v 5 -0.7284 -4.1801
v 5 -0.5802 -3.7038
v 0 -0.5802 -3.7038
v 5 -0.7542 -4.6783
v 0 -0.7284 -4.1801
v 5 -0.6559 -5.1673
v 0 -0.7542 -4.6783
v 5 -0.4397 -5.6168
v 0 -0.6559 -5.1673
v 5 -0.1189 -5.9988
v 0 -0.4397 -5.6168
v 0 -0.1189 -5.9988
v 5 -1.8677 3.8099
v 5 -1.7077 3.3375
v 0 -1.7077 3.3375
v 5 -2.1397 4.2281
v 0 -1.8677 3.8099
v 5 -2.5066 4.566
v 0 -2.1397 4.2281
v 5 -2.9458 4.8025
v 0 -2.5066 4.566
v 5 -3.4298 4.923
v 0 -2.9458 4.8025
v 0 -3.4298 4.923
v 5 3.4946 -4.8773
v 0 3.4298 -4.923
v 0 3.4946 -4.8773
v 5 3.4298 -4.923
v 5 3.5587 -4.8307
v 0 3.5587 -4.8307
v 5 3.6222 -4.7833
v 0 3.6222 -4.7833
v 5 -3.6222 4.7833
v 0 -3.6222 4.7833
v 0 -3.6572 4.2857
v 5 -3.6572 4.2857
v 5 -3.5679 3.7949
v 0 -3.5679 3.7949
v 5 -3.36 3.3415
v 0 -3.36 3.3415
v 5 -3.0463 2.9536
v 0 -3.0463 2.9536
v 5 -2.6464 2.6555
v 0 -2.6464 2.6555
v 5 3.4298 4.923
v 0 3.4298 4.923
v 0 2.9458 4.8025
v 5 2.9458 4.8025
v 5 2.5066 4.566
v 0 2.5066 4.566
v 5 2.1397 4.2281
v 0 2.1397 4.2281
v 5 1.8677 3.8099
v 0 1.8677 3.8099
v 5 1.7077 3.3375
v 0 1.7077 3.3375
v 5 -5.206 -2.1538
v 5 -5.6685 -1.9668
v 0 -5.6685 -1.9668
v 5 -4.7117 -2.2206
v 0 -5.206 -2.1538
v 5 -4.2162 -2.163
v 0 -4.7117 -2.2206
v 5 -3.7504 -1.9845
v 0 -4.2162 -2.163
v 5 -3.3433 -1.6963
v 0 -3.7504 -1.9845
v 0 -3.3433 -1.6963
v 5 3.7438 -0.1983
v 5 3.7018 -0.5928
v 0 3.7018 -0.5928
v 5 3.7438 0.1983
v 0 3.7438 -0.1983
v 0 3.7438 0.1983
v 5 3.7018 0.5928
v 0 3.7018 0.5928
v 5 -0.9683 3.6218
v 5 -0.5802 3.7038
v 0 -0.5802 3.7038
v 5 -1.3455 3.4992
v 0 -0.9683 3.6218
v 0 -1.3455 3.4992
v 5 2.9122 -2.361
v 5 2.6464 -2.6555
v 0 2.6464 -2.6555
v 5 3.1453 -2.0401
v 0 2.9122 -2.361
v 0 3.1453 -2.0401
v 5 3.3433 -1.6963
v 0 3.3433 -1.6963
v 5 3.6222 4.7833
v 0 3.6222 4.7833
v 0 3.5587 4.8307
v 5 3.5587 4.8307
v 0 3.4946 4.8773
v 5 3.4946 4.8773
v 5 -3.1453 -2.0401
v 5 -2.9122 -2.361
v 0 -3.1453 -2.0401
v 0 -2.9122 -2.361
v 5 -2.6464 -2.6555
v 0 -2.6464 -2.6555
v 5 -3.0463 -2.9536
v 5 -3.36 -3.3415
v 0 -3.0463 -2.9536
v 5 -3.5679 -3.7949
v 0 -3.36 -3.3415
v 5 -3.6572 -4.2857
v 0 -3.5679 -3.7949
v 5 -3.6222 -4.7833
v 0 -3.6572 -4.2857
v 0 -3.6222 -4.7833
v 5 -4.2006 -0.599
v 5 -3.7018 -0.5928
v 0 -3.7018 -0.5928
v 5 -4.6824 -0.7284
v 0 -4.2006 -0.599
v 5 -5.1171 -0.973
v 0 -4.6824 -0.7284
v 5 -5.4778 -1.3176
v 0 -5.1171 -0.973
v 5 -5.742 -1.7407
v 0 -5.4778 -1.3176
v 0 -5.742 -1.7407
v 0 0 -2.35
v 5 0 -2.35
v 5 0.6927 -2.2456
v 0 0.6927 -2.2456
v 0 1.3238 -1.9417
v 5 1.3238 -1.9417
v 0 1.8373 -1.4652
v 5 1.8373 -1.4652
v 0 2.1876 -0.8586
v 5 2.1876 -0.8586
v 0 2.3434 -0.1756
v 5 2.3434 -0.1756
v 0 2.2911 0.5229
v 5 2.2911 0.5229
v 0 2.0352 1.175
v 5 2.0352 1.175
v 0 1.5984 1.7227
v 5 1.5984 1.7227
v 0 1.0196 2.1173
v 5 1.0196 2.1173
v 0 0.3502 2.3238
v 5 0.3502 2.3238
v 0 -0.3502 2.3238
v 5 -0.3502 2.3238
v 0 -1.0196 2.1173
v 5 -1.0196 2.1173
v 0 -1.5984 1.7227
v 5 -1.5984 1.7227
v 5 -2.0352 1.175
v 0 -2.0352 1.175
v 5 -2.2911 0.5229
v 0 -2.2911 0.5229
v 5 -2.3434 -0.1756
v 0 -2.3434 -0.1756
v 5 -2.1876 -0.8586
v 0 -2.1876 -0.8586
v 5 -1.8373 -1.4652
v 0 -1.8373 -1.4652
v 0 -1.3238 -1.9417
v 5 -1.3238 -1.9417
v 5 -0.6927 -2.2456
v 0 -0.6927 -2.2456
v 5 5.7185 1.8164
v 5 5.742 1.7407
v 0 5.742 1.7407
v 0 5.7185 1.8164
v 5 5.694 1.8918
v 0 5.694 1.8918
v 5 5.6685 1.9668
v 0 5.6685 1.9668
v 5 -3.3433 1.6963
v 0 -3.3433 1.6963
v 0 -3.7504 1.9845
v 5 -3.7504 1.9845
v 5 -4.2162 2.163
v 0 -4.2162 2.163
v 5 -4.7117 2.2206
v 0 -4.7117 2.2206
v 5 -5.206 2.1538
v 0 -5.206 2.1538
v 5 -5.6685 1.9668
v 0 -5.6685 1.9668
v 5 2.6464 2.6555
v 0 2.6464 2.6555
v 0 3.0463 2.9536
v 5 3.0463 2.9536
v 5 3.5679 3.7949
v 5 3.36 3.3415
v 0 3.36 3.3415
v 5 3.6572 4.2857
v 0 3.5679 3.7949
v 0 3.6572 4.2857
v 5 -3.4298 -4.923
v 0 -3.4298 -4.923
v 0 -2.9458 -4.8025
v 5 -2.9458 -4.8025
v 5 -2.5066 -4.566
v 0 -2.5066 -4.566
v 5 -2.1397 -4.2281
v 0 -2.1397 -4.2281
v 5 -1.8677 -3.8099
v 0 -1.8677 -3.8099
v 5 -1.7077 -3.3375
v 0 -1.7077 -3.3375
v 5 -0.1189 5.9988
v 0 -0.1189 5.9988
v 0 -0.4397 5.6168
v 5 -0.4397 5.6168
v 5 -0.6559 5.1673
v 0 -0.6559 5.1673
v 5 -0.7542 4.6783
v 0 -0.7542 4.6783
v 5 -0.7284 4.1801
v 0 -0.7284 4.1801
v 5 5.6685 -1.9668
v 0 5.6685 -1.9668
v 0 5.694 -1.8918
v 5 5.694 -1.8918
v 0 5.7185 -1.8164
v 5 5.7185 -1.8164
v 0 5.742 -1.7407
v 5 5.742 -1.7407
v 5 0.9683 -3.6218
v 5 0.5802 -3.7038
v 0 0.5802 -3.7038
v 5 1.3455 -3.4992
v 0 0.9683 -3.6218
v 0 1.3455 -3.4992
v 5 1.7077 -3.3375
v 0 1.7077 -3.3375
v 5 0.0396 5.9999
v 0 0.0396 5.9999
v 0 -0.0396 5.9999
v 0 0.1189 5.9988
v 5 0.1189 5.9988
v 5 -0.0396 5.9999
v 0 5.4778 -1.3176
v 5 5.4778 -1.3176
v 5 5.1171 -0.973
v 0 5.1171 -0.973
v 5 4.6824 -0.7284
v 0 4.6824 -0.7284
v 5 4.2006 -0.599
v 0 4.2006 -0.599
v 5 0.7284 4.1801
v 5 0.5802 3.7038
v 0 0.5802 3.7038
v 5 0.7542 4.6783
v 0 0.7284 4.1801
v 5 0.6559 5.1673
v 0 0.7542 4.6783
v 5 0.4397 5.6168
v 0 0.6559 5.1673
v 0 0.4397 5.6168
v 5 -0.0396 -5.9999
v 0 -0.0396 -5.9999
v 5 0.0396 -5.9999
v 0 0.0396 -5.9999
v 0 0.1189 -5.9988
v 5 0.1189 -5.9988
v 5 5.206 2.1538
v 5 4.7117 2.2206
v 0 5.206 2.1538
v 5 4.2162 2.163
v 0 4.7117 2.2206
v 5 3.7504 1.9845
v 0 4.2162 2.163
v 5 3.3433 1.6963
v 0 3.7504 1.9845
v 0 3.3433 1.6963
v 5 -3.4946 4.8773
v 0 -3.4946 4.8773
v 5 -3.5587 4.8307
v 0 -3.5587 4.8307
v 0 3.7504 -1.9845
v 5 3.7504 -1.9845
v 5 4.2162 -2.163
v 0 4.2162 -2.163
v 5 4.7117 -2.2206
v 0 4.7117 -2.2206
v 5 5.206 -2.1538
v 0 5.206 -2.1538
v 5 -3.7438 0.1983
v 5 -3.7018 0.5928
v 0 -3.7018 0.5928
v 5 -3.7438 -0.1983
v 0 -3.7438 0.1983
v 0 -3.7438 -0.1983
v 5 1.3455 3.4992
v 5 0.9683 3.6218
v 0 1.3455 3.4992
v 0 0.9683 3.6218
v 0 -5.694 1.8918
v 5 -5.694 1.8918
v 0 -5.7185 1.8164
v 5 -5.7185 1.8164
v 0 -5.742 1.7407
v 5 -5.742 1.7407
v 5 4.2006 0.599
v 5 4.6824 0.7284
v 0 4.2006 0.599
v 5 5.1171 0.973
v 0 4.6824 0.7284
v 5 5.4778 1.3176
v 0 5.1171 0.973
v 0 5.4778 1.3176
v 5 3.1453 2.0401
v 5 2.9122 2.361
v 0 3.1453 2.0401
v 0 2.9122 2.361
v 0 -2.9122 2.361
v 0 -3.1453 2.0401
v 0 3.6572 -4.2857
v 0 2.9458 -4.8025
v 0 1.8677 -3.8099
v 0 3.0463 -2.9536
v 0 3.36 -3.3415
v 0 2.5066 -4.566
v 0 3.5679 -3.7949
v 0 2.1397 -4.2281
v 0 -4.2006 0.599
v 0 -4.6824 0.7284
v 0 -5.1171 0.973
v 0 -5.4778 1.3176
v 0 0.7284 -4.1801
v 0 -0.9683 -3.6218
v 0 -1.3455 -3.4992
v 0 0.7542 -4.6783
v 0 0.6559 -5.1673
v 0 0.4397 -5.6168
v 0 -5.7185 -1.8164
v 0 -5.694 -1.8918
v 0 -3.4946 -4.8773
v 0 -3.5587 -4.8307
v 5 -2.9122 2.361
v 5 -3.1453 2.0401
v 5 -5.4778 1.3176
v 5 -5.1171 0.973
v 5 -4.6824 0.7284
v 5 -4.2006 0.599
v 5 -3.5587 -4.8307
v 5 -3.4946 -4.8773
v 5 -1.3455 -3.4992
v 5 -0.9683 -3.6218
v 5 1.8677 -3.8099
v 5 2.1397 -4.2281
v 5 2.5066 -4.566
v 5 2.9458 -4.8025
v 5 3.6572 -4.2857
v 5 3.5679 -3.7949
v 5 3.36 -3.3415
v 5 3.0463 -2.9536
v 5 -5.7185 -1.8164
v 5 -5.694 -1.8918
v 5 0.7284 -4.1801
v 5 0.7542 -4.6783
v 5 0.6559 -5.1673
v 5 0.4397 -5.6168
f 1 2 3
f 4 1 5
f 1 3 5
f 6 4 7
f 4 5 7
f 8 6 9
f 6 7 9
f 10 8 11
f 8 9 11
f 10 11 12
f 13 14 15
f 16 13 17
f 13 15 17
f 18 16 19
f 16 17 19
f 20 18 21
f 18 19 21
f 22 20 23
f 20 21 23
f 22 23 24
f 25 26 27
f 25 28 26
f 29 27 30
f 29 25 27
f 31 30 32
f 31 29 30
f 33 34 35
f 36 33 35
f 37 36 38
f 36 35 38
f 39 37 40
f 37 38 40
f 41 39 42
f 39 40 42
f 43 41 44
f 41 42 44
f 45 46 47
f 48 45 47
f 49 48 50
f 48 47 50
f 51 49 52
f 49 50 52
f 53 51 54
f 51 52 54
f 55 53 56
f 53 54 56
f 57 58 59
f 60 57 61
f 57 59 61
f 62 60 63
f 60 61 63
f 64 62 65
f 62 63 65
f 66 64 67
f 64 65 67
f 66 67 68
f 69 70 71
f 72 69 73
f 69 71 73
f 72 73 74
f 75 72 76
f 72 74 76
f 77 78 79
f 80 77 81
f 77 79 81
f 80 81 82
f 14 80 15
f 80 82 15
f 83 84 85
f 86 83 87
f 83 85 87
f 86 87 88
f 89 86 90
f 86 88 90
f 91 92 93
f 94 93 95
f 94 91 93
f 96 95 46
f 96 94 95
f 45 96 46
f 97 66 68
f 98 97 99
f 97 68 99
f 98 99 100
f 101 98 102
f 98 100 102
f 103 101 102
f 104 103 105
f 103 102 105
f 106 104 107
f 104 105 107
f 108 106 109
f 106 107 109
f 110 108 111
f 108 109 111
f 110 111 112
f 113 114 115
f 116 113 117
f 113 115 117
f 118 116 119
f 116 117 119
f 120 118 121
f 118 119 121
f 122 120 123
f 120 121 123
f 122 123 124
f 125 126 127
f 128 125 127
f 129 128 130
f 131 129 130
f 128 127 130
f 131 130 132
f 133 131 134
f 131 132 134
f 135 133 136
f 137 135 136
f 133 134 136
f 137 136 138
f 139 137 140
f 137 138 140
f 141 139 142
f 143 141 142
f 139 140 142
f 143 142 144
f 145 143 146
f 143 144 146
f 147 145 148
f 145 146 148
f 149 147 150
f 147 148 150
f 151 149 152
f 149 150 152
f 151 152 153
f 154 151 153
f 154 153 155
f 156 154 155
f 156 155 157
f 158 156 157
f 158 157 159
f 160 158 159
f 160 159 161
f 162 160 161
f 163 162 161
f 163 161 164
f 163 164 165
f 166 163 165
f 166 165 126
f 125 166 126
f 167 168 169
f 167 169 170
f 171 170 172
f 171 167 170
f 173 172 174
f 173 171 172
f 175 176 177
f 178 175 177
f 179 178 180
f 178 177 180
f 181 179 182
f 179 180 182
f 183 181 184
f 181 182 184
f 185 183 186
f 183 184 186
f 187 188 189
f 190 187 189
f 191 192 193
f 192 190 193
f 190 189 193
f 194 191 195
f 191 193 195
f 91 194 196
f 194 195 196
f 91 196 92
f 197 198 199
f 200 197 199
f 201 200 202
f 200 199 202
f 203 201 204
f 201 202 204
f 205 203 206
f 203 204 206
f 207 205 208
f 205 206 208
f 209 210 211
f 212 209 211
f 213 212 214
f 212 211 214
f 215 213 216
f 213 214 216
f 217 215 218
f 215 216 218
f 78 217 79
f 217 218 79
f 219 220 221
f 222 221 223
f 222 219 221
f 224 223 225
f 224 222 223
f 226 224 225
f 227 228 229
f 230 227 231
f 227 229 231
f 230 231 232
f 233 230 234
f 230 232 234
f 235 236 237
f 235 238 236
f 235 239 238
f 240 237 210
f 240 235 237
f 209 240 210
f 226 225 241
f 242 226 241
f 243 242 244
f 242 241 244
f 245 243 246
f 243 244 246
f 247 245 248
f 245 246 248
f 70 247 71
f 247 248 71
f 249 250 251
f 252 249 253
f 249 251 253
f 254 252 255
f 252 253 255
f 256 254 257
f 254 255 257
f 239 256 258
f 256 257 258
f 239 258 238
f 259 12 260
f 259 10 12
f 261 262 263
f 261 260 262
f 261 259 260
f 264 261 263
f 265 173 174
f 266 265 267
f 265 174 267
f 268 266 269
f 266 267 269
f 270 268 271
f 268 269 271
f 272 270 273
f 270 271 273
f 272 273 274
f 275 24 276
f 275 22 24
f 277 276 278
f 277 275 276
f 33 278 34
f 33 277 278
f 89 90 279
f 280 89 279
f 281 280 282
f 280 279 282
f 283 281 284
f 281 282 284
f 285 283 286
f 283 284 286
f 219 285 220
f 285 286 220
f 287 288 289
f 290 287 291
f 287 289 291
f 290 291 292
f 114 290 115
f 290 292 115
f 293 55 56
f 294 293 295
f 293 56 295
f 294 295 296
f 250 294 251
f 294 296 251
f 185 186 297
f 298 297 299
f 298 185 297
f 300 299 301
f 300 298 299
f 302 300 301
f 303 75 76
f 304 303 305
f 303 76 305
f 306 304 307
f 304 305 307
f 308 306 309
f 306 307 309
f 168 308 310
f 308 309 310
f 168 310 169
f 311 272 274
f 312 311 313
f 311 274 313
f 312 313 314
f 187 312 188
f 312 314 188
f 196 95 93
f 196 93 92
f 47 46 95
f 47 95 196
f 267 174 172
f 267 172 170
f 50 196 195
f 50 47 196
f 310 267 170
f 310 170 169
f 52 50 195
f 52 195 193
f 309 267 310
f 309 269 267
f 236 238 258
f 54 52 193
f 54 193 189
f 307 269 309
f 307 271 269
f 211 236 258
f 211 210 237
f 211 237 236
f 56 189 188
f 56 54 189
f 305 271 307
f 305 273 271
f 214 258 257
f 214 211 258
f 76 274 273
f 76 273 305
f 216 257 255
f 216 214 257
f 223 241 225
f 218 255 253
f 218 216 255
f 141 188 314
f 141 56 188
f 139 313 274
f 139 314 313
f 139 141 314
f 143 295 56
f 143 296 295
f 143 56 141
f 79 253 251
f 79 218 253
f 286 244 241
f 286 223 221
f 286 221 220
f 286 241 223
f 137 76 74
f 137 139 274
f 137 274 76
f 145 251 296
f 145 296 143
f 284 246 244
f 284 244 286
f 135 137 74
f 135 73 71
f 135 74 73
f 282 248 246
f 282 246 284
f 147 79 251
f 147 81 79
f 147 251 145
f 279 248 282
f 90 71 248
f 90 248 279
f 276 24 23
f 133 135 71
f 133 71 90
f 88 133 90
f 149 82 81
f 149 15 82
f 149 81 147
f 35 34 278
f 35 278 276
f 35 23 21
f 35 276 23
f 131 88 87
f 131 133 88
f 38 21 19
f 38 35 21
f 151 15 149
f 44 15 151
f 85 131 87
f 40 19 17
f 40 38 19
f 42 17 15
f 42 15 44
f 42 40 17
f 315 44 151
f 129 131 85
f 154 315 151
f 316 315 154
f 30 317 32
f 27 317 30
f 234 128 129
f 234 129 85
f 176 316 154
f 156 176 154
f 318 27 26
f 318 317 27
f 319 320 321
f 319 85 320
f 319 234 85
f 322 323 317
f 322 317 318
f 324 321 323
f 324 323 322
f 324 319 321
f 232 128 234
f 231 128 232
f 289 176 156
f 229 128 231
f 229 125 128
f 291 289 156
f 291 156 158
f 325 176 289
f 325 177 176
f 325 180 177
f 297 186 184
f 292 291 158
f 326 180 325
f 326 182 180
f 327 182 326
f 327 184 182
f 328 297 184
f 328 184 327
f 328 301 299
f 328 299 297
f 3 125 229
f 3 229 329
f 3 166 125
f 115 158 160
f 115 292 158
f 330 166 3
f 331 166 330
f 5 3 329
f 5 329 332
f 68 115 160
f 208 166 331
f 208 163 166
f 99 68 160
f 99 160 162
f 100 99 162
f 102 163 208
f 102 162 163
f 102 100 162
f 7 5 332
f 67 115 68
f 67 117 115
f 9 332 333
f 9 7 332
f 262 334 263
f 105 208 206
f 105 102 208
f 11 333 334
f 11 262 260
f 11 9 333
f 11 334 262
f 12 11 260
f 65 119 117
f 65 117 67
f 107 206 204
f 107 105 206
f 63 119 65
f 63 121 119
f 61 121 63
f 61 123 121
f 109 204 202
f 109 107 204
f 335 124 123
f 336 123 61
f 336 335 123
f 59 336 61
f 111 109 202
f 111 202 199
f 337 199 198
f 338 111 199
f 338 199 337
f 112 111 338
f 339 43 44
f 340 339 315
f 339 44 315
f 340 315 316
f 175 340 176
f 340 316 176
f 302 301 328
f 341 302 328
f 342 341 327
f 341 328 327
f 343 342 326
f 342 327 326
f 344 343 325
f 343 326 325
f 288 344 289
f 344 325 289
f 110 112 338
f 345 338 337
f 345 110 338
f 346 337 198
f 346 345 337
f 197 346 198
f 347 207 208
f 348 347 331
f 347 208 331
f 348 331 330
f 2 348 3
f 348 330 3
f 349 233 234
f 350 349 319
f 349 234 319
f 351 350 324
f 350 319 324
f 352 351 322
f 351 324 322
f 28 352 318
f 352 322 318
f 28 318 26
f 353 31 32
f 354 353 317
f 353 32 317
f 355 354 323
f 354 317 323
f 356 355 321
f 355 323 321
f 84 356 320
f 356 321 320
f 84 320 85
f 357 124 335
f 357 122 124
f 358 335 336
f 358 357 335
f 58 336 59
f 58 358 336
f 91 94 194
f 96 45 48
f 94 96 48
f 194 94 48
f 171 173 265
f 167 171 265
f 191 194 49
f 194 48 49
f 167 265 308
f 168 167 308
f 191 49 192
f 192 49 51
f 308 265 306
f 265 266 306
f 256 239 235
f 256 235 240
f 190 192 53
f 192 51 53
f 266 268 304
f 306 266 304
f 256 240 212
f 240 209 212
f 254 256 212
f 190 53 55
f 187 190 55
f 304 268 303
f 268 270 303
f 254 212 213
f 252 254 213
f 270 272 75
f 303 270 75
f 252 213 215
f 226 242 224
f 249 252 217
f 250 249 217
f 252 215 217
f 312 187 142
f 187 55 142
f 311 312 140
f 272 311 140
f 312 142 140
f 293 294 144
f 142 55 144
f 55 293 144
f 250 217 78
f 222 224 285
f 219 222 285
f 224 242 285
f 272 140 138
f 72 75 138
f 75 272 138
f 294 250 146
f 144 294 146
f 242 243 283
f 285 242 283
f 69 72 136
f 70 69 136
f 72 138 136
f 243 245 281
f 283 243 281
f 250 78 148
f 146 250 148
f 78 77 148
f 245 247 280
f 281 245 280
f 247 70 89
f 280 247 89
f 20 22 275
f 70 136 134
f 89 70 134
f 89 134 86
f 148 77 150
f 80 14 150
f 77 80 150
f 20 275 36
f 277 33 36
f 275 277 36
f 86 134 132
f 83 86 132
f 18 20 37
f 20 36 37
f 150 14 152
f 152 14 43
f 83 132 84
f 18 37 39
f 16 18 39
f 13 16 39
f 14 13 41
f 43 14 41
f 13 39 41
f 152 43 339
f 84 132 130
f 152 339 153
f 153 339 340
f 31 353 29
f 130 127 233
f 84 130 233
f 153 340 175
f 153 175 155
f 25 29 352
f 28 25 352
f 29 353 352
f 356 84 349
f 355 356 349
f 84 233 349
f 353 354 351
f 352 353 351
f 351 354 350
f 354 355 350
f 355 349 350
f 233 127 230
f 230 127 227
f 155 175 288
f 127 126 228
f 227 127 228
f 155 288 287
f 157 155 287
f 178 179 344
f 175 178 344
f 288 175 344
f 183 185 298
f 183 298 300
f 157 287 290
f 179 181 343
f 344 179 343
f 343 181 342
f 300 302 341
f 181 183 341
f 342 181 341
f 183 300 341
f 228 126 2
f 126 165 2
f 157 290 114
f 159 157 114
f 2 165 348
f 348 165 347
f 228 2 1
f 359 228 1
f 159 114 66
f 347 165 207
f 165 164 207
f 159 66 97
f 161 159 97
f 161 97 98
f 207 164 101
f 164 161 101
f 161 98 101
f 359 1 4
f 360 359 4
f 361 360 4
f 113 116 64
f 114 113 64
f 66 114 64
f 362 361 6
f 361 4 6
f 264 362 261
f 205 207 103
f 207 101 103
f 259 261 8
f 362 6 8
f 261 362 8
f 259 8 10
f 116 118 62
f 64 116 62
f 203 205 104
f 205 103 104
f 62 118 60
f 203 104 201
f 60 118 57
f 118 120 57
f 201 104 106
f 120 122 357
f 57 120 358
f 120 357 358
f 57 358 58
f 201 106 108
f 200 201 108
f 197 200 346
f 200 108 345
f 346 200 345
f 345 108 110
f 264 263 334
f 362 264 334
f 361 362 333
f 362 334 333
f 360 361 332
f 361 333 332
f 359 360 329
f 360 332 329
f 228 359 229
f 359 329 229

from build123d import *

# Parameters (mm, degrees)
BASPROSKE_W        = 5
BASPROSKE_H        = 6
TOOTHCUT_DEPTH     = 10.848857802
TEETHCUTS_COUNT    = 10
TEETHCUTS_ANGLE    = 324
BORSKE_R           = 0.4
BORE_DEPTH         = 50.0000508
SKETCH1_R          = 2.35
CUT_EXTRUDE1_DEPTH = 10.693816982


with BuildPart() as part:
    # BasProSke → Base-Revolve (revolve)
    with BuildSketch(Plane(origin=(0, 0, 0), x_dir=(1, 0, 0), z_dir=(0, 1, 0)), mode=Mode.PRIVATE) as base_revolve_sk:
        with Locations((2.5, 3)):
            Rectangle(BASPROSKE_W, BASPROSKE_H)
    revolve(base_revolve_sk.sketch.rotate(Axis((-10, 0, 0), (1, 0, 0)), 180), axis=Axis((-10, 0, 0), (1, 0, 0)))

    # TooCutSke → ToothCut (cut, through all)
    with BuildSketch(Plane(origin=(0, 0, 0), x_dir=(0, 0, -1), z_dir=(1, 0, 0))):
        with BuildLine():
            ThreePointArc((0.59278292, 3.701838653), (0, 3.749), (-0.59278292, 3.701838653))
            ThreePointArc((-0.59278292, 3.701838653), (-0.846593509, 4.924114224), (-1.775771316, 5.757784417))
            ThreePointArc((-1.775771316, 5.757784417), (0, 6.0254), (1.775771316, 5.757784417))
            ThreePointArc((1.775771316, 5.757784417), (0.846593509, 4.924114224), (0.59278292, 3.701838653))
        make_face()
    toothcut = extrude(amount=TOOTHCUT_DEPTH, mode=Mode.SUBTRACT)

    # TeethCuts: ToothCut ×10 about axis
    teethcuts_axis = Axis((-10, 0, 0), (1, 0, 0))
    for i in range(1, TEETHCUTS_COUNT):
        add(toothcut.rotate(teethcuts_axis, i * TEETHCUTS_ANGLE / (TEETHCUTS_COUNT - 1)), mode=Mode.SUBTRACT)

    # BorSke → Bore (cut, symmetric)
    with BuildSketch(Plane(origin=(0, 0, 0), x_dir=(0, 0, -1), z_dir=(1, 0, 0))):
        with Locations(Location((0, 0, 0), (0, 0, 180))):
            Circle(BORSKE_R)
    extrude(amount=BORE_DEPTH, both=True, mode=Mode.SUBTRACT)

    # Sketch1 → Cut-Extrude1 (cut, through all)
    with BuildSketch(Plane(origin=(5, 0, 0), x_dir=(0, 0, -1), z_dir=(1, 0, 0))):
        Circle(SKETCH1_R)
    extrude(amount=-CUT_EXTRUDE1_DEPTH, mode=Mode.SUBTRACT)


solid = part.part
